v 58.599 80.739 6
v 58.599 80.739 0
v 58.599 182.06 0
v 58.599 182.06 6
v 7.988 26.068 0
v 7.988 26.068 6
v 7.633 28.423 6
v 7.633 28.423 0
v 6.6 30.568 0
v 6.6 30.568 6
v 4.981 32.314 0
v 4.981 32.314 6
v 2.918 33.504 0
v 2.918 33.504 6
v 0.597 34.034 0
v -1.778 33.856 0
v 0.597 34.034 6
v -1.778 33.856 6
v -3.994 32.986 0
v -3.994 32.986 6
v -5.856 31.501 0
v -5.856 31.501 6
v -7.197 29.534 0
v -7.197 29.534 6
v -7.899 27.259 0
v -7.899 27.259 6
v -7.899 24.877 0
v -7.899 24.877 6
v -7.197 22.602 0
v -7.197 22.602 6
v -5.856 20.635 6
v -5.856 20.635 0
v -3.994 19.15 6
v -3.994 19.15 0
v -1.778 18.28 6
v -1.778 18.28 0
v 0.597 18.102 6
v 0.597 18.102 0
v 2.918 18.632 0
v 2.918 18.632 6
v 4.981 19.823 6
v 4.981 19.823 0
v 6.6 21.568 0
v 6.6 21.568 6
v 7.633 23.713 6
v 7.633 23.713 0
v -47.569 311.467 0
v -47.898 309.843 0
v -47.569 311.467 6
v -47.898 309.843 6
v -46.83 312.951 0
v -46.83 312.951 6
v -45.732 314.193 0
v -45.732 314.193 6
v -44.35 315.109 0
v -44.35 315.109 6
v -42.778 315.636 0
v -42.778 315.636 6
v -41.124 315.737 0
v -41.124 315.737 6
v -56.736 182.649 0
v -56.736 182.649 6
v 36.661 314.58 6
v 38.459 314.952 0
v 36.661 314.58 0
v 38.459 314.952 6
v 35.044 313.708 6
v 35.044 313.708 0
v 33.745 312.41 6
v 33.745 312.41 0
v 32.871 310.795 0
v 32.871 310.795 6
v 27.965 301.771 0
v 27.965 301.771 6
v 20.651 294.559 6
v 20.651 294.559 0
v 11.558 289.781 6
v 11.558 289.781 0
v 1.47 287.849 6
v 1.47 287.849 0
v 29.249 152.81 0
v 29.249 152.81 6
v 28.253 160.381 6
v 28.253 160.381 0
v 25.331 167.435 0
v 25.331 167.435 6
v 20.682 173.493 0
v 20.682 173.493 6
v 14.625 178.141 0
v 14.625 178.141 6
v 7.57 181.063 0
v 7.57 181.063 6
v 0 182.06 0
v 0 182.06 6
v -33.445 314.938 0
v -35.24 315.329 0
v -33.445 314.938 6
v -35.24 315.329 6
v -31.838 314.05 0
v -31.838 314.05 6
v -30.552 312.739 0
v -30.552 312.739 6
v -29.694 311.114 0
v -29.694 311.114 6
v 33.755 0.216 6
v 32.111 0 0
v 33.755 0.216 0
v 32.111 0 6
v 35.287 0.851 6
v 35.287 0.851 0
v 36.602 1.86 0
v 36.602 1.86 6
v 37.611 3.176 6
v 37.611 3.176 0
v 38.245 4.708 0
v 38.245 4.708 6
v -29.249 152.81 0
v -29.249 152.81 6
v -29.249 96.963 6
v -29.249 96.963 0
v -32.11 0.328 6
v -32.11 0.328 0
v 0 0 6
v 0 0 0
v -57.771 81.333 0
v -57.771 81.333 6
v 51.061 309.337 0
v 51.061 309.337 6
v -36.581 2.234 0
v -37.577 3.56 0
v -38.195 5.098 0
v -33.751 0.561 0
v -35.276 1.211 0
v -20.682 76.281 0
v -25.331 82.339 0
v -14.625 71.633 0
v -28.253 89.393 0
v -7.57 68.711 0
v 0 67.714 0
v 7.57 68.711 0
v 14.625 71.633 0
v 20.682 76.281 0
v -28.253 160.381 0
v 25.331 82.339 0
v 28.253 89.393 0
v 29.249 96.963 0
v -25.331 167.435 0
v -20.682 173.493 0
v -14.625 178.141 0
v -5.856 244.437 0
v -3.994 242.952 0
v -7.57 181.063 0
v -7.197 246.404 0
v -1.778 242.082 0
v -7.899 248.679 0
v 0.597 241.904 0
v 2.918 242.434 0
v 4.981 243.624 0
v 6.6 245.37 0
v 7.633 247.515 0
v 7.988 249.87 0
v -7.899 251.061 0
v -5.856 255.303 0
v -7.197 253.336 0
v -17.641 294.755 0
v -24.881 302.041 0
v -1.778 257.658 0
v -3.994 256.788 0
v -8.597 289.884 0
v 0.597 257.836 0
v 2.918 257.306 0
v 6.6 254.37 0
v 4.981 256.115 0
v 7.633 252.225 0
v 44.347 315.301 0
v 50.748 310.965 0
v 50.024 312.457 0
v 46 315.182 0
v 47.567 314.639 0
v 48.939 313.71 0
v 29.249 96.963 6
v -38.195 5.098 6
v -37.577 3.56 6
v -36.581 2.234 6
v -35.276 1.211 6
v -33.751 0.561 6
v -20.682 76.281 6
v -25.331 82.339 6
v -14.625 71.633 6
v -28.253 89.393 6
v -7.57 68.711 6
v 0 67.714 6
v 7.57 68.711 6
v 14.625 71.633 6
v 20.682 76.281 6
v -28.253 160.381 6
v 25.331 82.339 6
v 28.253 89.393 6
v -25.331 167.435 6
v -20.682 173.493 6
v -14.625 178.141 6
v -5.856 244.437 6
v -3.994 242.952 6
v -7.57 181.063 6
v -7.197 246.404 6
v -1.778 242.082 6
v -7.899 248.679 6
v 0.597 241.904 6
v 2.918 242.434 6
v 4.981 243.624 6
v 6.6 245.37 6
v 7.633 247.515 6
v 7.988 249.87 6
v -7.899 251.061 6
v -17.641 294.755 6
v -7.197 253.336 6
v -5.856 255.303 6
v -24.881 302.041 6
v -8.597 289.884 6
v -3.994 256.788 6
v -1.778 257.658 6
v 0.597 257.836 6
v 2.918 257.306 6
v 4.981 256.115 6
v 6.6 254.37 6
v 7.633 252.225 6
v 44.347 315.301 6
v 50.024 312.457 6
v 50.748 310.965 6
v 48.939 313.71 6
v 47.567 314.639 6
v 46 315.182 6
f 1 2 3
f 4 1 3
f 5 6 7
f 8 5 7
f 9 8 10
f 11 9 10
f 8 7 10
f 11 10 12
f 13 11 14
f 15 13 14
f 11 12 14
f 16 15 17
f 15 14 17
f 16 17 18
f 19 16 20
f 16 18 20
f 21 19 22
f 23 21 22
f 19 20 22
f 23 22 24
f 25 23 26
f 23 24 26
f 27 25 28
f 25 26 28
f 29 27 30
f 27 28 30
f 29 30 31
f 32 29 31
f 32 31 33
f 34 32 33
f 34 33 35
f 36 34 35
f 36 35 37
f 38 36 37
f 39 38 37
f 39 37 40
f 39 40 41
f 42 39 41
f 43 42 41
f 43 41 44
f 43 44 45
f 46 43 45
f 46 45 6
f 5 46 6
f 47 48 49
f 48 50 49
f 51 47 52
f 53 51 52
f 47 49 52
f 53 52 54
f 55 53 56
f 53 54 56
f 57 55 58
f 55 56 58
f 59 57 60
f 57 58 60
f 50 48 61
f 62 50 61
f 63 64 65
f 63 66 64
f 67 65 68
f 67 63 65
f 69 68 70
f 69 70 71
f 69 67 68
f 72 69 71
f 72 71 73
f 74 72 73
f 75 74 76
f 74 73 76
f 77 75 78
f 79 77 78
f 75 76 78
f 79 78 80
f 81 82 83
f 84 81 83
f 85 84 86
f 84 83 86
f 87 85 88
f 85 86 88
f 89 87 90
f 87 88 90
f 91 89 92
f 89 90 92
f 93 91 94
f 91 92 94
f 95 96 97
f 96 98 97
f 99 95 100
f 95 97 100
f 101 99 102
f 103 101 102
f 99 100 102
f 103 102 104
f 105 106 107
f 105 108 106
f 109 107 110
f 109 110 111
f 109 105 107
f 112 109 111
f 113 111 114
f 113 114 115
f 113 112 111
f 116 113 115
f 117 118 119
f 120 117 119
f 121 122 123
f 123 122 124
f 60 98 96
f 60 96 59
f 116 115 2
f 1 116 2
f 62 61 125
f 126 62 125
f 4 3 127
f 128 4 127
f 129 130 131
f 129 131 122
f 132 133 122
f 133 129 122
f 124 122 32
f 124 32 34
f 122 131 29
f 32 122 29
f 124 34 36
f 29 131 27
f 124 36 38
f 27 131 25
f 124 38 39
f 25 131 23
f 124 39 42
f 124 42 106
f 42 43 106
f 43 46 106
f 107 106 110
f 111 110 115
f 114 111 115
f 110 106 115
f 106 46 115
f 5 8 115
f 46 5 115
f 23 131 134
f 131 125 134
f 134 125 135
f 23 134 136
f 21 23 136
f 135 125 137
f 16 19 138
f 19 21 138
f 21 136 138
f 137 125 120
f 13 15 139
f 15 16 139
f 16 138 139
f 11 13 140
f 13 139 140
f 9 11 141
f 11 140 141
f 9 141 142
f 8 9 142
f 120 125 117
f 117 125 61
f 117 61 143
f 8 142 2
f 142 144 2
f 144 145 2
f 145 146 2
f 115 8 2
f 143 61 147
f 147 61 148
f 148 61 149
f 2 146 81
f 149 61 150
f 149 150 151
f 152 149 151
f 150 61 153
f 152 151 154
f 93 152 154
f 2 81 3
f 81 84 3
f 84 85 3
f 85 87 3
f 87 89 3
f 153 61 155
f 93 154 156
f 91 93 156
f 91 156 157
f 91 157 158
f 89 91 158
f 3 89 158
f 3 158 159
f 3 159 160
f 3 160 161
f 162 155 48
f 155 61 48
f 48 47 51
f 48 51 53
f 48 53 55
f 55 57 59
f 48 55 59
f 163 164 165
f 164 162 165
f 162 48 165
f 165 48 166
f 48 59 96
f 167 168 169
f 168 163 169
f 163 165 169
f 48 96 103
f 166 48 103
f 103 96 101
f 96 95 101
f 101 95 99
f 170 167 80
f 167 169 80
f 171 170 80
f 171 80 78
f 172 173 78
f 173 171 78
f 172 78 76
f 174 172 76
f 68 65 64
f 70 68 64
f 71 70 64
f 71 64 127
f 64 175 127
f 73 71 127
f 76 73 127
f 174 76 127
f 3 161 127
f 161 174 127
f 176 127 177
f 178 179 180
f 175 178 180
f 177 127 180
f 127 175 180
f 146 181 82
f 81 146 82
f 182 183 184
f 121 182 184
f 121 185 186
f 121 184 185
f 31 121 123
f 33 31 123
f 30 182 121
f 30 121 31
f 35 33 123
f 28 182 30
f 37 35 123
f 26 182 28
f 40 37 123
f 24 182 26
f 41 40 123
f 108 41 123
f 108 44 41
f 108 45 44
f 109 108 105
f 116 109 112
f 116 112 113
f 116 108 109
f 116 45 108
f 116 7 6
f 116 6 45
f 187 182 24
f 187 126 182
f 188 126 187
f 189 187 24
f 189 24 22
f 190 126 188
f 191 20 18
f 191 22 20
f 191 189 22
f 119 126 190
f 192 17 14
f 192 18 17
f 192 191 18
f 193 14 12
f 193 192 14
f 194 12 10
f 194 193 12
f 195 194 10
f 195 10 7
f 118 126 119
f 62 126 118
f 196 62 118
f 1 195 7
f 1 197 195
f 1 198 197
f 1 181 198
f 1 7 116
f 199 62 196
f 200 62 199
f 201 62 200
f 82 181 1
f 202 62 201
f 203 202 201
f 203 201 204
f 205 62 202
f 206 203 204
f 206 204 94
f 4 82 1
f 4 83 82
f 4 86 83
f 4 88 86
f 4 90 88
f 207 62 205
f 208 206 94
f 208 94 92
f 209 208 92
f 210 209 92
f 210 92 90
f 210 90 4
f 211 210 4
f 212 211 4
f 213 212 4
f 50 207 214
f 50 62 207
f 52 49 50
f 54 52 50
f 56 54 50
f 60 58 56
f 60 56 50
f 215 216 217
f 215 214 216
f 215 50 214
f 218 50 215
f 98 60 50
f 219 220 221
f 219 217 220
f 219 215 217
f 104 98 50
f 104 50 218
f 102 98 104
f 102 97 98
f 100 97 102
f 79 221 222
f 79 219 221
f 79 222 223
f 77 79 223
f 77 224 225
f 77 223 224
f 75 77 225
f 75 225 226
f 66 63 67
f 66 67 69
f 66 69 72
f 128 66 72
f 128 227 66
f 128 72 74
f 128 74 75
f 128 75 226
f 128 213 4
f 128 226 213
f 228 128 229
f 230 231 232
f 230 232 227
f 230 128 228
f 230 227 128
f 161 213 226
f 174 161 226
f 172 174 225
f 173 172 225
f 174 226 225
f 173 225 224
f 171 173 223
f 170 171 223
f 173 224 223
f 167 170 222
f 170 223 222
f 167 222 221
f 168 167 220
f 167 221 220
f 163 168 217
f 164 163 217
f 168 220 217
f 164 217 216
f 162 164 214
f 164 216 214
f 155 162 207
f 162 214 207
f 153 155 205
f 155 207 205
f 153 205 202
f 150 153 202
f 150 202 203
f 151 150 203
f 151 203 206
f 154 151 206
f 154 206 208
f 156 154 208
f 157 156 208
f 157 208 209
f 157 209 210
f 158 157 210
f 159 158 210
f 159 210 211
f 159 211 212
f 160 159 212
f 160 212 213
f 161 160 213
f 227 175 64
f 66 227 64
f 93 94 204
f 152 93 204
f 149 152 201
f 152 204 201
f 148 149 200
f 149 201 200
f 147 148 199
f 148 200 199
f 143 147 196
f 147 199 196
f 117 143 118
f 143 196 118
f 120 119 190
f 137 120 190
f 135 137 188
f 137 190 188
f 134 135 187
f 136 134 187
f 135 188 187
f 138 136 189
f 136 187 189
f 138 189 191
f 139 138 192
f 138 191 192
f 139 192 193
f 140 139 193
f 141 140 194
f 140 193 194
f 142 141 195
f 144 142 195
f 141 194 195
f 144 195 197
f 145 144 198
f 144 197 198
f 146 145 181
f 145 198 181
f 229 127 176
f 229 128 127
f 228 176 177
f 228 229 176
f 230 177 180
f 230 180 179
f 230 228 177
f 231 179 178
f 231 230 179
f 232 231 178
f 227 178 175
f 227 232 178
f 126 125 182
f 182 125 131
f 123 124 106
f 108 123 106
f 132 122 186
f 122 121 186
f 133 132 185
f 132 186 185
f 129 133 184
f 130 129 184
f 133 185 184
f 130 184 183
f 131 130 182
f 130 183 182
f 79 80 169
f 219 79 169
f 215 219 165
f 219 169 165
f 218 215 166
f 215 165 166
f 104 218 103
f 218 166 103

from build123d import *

# Parameters (mm, degrees)
F1_DEPTH = 6
F2_R     = 7.9883
F3_DEPTH = 25.4
F6_DEPTH = 25.4
F7_R     = 6.35


with BuildPart() as f1:
    # F0 (on Top) → F1 (new body)
    with BuildSketch(Plane.XY):
        with BuildLine():
            Line((1.470284, 287.84881), (0, 0))
            Line((0, 0), (36.98494, 0))
            Line((36.98494, 0), (58.59907, 80.73898))
            Line((58.59907, 80.73898), (58.59907, 182.05958))
            Line((58.59907, 182.05958), (50.6857, 315.67628))
            Line((50.6857, 315.67628), (34.044278, 314.690702))
            ThreePointArc((34.044278, 314.690702), (22.258545, 295.807244), (1.470284, 287.84881))
        make_face()
        with BuildLine():
            Line((-36.98301, 0.377816), (0, 0))
            Line((0, 0), (1.470284, 287.84881))
            ThreePointArc((1.470284, 287.84881), (-19.235594, 296.019189), (-30.82781, 315.022057))
            Line((-30.82781, 315.022057), (-47.458296, 316.177583))
            Line((-47.458296, 316.177583), (-56.736201, 182.648693))
            Line((-56.736201, 182.648693), (-57.771231, 81.33338))
            Line((-57.771231, 81.33338), (-36.98301, 0.377816))
        make_face()
    extrude(amount=F1_DEPTH)

    # F2 (on face) → F3 (cut)
    with BuildSketch(Plane.XY.offset(6)):
        with Locations((0, 249.86996)):
            Circle(F2_R)
        with Locations((0, 26.06802)):
            Circle(F2_R)
    extrude(amount=-F3_DEPTH, mode=Mode.SUBTRACT)

    # F5 (on face) → F6 (cut)
    with BuildSketch(Plane.XY.offset(6)):
        with BuildLine():
            ThreePointArc((-29.24937, 96.96323), (-20.682428, 76.280802), (0, 67.71386))
            ThreePointArc((0, 67.71386), (20.682428, 76.280802), (29.24937, 96.96323))
            Line((29.24937, 96.96323), (29.24937, 152.81021))
            ThreePointArc((29.24937, 152.81021), (20.682428, 173.492638), (0, 182.05958))
            ThreePointArc((0, 182.05958), (-20.682428, 173.492638), (-29.24937, 152.81021))
            Line((-29.24937, 152.81021), (-29.24937, 96.96323))
        make_face()
    extrude(amount=-F6_DEPTH, mode=Mode.SUBTRACT)

    # F7
    f7_edges = [f1.edges().sort_by_distance(p)[0] for p in [
        (-36.98301, 0.377816, 3),
        (36.98494, 0, 3),
        (50.6857, 315.67628, 3),
        (34.044278, 314.690702, 3),
        (-30.82781, 315.022057, 3),
        (-47.458296, 316.177583, 3),
    ]]
    fillet(f7_edges, radius=F7_R)


solid = f1.part
